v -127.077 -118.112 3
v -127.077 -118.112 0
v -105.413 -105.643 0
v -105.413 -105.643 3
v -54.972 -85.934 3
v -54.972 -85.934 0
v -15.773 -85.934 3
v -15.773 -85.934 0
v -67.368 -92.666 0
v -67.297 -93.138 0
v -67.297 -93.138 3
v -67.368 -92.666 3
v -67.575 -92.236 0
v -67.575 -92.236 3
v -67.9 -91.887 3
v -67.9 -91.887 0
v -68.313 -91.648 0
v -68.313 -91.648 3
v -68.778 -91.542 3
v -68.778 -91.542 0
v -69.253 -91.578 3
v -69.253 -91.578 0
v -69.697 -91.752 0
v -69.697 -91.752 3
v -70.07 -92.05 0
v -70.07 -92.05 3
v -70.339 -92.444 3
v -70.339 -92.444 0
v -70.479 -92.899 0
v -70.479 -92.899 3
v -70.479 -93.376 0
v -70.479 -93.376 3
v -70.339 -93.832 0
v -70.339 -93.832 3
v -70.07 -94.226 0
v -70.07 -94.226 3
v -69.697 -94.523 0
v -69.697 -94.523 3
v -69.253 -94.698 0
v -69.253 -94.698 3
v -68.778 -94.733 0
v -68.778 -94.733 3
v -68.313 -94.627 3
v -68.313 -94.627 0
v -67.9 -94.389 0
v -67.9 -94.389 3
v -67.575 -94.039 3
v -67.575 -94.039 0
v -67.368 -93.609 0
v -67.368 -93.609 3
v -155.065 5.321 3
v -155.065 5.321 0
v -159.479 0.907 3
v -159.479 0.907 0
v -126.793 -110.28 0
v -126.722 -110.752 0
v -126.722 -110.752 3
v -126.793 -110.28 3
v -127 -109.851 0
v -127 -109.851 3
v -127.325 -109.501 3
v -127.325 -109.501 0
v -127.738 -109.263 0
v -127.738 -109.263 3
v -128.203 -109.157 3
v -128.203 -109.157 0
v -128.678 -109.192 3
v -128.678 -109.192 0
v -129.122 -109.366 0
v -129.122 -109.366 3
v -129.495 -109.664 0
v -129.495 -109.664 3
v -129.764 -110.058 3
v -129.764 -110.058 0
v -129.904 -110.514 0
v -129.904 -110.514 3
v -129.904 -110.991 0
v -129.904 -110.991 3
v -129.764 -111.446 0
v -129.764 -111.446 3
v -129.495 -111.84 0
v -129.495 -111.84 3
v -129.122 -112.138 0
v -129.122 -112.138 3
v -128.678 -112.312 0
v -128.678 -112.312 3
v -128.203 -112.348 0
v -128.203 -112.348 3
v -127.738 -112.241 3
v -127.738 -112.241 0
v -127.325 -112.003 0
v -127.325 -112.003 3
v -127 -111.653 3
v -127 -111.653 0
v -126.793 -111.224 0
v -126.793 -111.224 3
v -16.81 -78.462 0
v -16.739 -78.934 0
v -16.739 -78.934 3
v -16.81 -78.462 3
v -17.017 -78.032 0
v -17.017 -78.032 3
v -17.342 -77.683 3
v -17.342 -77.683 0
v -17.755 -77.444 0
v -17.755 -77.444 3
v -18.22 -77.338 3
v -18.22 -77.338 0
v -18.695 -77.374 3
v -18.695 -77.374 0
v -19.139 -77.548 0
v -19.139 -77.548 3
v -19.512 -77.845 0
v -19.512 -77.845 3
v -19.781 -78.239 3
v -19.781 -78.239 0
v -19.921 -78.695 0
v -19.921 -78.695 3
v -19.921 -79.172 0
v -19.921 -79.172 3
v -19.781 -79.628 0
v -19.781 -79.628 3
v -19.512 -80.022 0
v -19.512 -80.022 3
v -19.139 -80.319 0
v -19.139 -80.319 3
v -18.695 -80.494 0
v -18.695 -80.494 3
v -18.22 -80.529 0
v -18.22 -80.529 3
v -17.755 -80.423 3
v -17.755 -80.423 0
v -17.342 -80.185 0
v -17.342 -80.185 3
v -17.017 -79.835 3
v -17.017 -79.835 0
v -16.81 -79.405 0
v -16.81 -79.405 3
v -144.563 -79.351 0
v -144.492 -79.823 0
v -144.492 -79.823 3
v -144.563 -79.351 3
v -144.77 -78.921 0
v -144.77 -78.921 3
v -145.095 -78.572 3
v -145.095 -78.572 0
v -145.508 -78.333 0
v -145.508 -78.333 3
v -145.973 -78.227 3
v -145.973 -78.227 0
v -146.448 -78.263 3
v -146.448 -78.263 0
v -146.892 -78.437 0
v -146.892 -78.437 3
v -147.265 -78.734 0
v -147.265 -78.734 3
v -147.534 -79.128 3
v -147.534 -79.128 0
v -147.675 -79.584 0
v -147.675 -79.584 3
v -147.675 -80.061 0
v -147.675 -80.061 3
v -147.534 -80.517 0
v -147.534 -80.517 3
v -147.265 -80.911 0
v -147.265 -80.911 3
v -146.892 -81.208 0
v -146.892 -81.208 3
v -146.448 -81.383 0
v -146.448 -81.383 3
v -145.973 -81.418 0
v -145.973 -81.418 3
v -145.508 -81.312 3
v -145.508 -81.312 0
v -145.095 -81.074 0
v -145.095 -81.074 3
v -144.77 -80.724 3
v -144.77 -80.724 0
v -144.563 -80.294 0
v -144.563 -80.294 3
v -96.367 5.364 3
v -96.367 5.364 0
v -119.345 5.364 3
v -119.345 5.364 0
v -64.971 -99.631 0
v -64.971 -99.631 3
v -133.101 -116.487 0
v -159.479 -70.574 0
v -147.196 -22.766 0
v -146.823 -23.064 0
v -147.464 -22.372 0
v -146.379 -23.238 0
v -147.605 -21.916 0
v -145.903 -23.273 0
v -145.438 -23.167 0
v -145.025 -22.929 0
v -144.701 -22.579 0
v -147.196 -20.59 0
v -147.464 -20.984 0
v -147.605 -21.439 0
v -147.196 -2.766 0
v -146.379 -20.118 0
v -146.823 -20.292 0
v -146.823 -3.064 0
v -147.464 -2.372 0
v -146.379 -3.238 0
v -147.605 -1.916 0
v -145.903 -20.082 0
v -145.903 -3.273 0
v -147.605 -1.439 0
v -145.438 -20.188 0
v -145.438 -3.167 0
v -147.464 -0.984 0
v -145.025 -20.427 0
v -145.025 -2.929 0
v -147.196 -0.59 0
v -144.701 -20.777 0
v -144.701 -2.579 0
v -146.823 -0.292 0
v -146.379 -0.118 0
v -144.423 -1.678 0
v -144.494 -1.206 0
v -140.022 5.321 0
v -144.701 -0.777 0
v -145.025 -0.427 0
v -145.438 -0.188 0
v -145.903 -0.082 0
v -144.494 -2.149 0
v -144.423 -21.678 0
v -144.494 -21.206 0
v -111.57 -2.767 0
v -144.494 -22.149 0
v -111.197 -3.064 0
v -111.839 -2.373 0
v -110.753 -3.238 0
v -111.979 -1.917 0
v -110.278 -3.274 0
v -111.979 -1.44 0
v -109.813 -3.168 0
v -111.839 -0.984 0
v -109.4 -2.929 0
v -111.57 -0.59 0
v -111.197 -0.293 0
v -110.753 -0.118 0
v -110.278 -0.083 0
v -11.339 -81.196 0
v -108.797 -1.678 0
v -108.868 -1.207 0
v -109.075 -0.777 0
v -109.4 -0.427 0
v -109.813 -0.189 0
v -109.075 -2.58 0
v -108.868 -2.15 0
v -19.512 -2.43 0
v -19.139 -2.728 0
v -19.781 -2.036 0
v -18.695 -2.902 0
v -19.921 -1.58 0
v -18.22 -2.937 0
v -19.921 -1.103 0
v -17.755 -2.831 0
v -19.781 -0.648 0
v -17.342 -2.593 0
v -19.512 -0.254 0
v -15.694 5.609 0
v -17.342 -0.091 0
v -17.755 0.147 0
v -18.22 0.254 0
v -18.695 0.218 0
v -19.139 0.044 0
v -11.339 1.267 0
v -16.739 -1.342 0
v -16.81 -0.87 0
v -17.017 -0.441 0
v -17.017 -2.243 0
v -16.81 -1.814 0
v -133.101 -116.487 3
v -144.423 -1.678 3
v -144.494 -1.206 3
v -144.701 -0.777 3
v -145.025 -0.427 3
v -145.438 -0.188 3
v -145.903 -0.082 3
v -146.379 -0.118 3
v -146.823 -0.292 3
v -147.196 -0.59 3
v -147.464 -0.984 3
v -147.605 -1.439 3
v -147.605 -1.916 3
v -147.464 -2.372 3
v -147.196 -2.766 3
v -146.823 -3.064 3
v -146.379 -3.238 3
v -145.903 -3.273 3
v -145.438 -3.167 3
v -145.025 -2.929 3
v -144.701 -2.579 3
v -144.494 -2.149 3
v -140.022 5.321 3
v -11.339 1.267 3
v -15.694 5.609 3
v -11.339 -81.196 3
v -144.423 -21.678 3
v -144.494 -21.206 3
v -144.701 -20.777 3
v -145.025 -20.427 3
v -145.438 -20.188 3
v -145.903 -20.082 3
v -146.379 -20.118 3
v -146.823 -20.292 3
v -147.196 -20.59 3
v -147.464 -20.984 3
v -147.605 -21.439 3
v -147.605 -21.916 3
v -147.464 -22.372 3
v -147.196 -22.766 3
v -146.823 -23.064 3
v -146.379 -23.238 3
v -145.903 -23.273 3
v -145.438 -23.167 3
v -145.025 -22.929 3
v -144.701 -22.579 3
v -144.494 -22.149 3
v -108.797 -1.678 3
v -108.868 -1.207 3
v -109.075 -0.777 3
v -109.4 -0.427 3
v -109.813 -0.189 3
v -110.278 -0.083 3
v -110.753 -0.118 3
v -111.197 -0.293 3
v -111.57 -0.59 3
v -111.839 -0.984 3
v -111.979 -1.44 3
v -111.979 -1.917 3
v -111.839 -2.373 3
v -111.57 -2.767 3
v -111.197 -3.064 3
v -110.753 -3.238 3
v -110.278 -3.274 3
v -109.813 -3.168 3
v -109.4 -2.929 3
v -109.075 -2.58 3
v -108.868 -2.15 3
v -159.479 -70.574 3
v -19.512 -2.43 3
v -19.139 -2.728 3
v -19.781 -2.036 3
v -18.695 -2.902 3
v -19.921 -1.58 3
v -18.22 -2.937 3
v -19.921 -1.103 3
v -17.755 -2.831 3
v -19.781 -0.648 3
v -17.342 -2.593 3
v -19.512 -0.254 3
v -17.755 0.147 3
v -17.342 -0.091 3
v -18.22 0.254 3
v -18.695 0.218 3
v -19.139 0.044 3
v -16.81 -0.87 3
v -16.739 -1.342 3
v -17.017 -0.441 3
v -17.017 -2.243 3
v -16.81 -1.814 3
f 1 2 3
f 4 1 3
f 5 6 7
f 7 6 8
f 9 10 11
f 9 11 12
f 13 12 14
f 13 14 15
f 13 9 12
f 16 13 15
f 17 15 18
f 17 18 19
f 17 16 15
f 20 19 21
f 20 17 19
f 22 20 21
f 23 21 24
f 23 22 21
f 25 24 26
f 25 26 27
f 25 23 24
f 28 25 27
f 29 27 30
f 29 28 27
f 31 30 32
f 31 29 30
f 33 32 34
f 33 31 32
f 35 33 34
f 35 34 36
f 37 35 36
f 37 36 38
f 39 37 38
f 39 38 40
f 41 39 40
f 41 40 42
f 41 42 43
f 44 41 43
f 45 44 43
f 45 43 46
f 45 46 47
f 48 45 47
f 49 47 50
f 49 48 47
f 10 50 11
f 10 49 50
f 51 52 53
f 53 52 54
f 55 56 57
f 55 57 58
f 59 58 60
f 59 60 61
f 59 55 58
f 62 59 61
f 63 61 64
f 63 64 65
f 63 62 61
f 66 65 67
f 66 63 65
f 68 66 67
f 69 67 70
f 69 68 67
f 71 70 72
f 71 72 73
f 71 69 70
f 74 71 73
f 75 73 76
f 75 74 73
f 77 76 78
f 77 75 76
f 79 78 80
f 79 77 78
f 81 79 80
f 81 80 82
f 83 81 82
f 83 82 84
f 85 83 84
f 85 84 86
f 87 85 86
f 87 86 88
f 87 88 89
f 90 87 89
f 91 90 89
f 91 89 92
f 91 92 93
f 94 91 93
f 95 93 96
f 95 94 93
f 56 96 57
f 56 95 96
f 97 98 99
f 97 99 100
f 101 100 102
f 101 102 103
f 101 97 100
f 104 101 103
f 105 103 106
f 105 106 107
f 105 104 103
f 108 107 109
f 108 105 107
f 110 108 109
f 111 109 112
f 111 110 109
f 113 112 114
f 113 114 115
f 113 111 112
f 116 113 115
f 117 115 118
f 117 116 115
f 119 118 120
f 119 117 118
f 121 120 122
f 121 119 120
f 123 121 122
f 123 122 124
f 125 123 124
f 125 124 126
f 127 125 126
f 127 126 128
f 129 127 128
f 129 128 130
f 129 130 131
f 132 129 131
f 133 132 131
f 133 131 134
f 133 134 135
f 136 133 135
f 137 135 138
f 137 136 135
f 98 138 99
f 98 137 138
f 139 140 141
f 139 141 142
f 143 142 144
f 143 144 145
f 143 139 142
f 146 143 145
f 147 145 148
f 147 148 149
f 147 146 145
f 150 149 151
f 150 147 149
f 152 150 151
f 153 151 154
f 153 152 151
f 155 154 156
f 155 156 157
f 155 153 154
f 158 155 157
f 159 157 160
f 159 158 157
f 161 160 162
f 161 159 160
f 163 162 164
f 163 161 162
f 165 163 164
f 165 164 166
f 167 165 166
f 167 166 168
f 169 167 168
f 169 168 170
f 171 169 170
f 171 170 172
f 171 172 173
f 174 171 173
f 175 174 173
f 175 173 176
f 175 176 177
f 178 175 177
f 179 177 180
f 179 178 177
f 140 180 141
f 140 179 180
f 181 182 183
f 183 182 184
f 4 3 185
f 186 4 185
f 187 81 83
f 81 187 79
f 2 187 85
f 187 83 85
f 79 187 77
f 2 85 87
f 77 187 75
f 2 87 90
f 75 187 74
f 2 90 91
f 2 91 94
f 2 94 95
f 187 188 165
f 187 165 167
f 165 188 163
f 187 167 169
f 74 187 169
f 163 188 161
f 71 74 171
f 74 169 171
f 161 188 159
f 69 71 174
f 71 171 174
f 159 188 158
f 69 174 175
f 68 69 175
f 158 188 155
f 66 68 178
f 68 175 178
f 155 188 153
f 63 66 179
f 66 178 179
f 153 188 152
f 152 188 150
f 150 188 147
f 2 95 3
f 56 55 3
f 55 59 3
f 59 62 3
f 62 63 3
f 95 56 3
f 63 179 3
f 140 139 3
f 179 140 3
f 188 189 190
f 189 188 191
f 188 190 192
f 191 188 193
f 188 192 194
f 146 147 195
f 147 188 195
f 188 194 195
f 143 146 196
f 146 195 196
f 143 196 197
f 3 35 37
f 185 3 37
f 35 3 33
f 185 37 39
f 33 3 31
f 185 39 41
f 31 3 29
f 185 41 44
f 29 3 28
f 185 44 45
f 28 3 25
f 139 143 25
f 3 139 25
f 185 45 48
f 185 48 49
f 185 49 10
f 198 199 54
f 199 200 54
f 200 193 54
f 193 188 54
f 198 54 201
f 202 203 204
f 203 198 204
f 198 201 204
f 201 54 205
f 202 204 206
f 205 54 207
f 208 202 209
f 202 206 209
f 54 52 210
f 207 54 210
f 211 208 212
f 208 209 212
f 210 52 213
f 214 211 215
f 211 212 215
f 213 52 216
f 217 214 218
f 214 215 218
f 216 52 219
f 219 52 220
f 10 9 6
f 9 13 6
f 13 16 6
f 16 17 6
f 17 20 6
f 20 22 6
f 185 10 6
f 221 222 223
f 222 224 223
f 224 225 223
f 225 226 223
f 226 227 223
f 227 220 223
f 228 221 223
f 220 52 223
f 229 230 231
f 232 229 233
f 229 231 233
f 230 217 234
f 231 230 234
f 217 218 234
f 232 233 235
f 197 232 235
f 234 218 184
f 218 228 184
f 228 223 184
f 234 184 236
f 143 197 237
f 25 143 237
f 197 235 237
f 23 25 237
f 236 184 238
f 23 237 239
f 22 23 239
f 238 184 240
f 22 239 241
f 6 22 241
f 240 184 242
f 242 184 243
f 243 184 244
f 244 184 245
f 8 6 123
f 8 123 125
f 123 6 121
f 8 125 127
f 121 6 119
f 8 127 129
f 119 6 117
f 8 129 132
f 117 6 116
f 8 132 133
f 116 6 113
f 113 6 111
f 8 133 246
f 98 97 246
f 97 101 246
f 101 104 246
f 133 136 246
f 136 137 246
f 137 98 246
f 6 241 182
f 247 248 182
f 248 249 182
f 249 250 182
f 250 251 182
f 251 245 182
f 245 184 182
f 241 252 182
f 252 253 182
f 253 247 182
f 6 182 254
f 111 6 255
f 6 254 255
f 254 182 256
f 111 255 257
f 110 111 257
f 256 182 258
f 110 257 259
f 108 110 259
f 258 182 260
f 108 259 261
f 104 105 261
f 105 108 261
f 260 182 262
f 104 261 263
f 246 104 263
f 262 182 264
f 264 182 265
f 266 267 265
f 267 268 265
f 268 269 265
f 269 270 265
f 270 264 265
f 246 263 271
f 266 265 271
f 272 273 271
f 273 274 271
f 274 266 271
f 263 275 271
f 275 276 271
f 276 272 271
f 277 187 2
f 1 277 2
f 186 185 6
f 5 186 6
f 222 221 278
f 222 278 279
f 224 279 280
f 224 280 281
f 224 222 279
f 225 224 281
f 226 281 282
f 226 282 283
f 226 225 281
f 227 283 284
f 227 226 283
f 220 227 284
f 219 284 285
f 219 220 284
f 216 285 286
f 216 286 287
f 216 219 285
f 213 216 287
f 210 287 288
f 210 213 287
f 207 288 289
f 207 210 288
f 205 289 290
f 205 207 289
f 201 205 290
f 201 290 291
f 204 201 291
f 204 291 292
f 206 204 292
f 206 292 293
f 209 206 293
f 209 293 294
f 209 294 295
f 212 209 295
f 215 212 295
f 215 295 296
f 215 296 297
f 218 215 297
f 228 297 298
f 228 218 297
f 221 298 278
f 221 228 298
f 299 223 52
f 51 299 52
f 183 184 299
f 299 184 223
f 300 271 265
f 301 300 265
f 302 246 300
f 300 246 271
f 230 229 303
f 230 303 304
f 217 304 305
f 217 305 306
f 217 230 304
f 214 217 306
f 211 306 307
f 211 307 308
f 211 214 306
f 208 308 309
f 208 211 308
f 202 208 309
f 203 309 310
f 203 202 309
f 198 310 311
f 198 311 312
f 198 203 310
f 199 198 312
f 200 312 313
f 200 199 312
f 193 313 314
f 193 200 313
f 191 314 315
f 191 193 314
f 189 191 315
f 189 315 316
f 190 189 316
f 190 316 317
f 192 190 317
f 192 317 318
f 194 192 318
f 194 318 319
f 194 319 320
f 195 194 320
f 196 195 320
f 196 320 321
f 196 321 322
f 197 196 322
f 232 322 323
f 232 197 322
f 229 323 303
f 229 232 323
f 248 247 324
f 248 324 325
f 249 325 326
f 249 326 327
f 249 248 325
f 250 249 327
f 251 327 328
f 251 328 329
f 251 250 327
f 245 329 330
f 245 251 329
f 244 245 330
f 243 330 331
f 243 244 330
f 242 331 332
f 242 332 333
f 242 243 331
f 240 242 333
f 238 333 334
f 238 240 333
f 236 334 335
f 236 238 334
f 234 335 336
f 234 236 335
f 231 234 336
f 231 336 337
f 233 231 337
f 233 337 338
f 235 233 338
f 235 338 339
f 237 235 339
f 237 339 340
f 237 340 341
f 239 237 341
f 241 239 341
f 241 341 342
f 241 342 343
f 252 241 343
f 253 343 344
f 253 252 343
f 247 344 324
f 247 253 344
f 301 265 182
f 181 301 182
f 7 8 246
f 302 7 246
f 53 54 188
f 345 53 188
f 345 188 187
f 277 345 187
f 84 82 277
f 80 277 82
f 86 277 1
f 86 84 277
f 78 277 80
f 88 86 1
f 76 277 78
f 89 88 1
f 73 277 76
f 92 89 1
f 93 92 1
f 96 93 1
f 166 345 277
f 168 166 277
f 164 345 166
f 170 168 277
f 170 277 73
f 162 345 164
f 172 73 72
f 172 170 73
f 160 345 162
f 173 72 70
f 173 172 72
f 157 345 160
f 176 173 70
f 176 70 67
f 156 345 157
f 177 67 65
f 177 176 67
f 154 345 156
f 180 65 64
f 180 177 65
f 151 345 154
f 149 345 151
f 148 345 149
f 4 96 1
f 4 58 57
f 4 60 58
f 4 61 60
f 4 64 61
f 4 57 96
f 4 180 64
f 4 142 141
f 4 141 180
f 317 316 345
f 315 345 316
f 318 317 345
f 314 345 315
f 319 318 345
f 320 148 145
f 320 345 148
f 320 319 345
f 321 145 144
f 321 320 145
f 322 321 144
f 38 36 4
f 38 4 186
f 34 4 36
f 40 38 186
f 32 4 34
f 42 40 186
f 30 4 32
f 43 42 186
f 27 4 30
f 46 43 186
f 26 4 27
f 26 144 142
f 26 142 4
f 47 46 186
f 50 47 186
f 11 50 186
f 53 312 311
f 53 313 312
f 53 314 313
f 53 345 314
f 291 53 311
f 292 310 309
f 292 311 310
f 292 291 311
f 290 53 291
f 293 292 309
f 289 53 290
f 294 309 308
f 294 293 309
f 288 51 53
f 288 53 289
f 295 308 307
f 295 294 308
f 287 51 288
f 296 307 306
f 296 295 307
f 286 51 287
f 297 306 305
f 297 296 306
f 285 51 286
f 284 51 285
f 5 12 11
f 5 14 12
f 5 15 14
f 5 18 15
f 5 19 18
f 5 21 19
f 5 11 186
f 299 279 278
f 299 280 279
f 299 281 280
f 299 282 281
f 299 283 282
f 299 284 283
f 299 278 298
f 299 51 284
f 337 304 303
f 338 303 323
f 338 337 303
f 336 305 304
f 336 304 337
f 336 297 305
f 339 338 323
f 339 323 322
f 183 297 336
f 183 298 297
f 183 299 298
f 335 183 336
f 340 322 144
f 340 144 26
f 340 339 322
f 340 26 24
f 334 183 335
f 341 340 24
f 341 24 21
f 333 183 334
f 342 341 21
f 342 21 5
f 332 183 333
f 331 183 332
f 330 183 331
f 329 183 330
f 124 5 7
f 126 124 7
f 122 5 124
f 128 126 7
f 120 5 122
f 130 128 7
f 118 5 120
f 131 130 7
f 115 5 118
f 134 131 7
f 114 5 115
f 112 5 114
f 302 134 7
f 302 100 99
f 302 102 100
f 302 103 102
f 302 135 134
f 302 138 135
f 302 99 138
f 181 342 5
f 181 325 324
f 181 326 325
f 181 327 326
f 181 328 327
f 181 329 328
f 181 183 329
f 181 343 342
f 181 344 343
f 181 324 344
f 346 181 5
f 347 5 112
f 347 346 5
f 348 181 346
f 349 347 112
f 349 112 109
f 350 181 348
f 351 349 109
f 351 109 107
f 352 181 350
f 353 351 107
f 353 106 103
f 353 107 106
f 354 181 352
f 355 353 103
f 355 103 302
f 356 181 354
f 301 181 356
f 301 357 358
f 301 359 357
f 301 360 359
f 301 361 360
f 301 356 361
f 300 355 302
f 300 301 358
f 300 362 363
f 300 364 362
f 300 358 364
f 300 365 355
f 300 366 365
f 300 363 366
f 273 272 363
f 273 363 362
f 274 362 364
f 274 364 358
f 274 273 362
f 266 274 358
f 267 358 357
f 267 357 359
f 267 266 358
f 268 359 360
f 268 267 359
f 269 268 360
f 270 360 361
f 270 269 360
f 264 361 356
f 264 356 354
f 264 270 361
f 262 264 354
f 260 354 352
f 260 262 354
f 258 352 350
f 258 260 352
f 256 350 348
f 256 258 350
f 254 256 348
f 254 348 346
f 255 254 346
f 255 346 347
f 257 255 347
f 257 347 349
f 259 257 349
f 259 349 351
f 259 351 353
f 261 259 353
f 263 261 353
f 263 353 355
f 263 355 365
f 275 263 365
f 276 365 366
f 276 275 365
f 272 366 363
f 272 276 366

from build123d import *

# Parameters (mm, degrees)
ESQUISSE1_R        = 1.6
BOSS_EXTRU_1_DEPTH = 3


with BuildPart() as part:
    # Esquisse1 → Boss.-Extru.1 (new body)
    with BuildSketch(Plane.XY):
        Polygon((-15.693595538, 5.608560861), (-96.367147031, 5.364168479), (-103.365175584, 5.364168479), (-119.344550333, 5.364168479), (-140.021777649, 5.320852512), (-155.064772313, 5.320852512), (-159.478985875, 0.90663895), (-159.478985875, -3.429484403), (-159.478985875, -70.574320891), (-133.100653393, -116.486520024), (-127.076613358, -118.11178196), (-105.412894174, -105.642711064), (-64.97062335, -99.631001274), (-54.971738012, -85.933633781), (-15.772854297, -85.933633781), (-11.339106961, -81.196072129), (-11.339106961, 1.267243786), align=None)
        with Locations((-18.339106961, -1.341926987)):
            Circle(ESQUISSE1_R, mode=Mode.SUBTRACT)
        with Locations((-110.397084988, -1.678365923)):
            Circle(ESQUISSE1_R, mode=Mode.SUBTRACT)
        with Locations((-18.339106961, -78.933633781)):
            Circle(ESQUISSE1_R, mode=Mode.SUBTRACT)
        with Locations((-68.897334865, -93.137788223)):
            Circle(ESQUISSE1_R, mode=Mode.SUBTRACT)
        with Locations((-128.322250168, -110.752044388)):
            Circle(ESQUISSE1_R, mode=Mode.SUBTRACT)
        with Locations((-146.0923789, -79.822656053)):
            Circle(ESQUISSE1_R, mode=Mode.SUBTRACT)
        with Locations((-146.02282508, -1.677868186)):
            Circle(ESQUISSE1_R, mode=Mode.SUBTRACT)
        with Locations((-146.02282508, -21.677868186)):
            Circle(ESQUISSE1_R, mode=Mode.SUBTRACT)
    extrude(amount=BOSS_EXTRU_1_DEPTH)


solid = part.part
